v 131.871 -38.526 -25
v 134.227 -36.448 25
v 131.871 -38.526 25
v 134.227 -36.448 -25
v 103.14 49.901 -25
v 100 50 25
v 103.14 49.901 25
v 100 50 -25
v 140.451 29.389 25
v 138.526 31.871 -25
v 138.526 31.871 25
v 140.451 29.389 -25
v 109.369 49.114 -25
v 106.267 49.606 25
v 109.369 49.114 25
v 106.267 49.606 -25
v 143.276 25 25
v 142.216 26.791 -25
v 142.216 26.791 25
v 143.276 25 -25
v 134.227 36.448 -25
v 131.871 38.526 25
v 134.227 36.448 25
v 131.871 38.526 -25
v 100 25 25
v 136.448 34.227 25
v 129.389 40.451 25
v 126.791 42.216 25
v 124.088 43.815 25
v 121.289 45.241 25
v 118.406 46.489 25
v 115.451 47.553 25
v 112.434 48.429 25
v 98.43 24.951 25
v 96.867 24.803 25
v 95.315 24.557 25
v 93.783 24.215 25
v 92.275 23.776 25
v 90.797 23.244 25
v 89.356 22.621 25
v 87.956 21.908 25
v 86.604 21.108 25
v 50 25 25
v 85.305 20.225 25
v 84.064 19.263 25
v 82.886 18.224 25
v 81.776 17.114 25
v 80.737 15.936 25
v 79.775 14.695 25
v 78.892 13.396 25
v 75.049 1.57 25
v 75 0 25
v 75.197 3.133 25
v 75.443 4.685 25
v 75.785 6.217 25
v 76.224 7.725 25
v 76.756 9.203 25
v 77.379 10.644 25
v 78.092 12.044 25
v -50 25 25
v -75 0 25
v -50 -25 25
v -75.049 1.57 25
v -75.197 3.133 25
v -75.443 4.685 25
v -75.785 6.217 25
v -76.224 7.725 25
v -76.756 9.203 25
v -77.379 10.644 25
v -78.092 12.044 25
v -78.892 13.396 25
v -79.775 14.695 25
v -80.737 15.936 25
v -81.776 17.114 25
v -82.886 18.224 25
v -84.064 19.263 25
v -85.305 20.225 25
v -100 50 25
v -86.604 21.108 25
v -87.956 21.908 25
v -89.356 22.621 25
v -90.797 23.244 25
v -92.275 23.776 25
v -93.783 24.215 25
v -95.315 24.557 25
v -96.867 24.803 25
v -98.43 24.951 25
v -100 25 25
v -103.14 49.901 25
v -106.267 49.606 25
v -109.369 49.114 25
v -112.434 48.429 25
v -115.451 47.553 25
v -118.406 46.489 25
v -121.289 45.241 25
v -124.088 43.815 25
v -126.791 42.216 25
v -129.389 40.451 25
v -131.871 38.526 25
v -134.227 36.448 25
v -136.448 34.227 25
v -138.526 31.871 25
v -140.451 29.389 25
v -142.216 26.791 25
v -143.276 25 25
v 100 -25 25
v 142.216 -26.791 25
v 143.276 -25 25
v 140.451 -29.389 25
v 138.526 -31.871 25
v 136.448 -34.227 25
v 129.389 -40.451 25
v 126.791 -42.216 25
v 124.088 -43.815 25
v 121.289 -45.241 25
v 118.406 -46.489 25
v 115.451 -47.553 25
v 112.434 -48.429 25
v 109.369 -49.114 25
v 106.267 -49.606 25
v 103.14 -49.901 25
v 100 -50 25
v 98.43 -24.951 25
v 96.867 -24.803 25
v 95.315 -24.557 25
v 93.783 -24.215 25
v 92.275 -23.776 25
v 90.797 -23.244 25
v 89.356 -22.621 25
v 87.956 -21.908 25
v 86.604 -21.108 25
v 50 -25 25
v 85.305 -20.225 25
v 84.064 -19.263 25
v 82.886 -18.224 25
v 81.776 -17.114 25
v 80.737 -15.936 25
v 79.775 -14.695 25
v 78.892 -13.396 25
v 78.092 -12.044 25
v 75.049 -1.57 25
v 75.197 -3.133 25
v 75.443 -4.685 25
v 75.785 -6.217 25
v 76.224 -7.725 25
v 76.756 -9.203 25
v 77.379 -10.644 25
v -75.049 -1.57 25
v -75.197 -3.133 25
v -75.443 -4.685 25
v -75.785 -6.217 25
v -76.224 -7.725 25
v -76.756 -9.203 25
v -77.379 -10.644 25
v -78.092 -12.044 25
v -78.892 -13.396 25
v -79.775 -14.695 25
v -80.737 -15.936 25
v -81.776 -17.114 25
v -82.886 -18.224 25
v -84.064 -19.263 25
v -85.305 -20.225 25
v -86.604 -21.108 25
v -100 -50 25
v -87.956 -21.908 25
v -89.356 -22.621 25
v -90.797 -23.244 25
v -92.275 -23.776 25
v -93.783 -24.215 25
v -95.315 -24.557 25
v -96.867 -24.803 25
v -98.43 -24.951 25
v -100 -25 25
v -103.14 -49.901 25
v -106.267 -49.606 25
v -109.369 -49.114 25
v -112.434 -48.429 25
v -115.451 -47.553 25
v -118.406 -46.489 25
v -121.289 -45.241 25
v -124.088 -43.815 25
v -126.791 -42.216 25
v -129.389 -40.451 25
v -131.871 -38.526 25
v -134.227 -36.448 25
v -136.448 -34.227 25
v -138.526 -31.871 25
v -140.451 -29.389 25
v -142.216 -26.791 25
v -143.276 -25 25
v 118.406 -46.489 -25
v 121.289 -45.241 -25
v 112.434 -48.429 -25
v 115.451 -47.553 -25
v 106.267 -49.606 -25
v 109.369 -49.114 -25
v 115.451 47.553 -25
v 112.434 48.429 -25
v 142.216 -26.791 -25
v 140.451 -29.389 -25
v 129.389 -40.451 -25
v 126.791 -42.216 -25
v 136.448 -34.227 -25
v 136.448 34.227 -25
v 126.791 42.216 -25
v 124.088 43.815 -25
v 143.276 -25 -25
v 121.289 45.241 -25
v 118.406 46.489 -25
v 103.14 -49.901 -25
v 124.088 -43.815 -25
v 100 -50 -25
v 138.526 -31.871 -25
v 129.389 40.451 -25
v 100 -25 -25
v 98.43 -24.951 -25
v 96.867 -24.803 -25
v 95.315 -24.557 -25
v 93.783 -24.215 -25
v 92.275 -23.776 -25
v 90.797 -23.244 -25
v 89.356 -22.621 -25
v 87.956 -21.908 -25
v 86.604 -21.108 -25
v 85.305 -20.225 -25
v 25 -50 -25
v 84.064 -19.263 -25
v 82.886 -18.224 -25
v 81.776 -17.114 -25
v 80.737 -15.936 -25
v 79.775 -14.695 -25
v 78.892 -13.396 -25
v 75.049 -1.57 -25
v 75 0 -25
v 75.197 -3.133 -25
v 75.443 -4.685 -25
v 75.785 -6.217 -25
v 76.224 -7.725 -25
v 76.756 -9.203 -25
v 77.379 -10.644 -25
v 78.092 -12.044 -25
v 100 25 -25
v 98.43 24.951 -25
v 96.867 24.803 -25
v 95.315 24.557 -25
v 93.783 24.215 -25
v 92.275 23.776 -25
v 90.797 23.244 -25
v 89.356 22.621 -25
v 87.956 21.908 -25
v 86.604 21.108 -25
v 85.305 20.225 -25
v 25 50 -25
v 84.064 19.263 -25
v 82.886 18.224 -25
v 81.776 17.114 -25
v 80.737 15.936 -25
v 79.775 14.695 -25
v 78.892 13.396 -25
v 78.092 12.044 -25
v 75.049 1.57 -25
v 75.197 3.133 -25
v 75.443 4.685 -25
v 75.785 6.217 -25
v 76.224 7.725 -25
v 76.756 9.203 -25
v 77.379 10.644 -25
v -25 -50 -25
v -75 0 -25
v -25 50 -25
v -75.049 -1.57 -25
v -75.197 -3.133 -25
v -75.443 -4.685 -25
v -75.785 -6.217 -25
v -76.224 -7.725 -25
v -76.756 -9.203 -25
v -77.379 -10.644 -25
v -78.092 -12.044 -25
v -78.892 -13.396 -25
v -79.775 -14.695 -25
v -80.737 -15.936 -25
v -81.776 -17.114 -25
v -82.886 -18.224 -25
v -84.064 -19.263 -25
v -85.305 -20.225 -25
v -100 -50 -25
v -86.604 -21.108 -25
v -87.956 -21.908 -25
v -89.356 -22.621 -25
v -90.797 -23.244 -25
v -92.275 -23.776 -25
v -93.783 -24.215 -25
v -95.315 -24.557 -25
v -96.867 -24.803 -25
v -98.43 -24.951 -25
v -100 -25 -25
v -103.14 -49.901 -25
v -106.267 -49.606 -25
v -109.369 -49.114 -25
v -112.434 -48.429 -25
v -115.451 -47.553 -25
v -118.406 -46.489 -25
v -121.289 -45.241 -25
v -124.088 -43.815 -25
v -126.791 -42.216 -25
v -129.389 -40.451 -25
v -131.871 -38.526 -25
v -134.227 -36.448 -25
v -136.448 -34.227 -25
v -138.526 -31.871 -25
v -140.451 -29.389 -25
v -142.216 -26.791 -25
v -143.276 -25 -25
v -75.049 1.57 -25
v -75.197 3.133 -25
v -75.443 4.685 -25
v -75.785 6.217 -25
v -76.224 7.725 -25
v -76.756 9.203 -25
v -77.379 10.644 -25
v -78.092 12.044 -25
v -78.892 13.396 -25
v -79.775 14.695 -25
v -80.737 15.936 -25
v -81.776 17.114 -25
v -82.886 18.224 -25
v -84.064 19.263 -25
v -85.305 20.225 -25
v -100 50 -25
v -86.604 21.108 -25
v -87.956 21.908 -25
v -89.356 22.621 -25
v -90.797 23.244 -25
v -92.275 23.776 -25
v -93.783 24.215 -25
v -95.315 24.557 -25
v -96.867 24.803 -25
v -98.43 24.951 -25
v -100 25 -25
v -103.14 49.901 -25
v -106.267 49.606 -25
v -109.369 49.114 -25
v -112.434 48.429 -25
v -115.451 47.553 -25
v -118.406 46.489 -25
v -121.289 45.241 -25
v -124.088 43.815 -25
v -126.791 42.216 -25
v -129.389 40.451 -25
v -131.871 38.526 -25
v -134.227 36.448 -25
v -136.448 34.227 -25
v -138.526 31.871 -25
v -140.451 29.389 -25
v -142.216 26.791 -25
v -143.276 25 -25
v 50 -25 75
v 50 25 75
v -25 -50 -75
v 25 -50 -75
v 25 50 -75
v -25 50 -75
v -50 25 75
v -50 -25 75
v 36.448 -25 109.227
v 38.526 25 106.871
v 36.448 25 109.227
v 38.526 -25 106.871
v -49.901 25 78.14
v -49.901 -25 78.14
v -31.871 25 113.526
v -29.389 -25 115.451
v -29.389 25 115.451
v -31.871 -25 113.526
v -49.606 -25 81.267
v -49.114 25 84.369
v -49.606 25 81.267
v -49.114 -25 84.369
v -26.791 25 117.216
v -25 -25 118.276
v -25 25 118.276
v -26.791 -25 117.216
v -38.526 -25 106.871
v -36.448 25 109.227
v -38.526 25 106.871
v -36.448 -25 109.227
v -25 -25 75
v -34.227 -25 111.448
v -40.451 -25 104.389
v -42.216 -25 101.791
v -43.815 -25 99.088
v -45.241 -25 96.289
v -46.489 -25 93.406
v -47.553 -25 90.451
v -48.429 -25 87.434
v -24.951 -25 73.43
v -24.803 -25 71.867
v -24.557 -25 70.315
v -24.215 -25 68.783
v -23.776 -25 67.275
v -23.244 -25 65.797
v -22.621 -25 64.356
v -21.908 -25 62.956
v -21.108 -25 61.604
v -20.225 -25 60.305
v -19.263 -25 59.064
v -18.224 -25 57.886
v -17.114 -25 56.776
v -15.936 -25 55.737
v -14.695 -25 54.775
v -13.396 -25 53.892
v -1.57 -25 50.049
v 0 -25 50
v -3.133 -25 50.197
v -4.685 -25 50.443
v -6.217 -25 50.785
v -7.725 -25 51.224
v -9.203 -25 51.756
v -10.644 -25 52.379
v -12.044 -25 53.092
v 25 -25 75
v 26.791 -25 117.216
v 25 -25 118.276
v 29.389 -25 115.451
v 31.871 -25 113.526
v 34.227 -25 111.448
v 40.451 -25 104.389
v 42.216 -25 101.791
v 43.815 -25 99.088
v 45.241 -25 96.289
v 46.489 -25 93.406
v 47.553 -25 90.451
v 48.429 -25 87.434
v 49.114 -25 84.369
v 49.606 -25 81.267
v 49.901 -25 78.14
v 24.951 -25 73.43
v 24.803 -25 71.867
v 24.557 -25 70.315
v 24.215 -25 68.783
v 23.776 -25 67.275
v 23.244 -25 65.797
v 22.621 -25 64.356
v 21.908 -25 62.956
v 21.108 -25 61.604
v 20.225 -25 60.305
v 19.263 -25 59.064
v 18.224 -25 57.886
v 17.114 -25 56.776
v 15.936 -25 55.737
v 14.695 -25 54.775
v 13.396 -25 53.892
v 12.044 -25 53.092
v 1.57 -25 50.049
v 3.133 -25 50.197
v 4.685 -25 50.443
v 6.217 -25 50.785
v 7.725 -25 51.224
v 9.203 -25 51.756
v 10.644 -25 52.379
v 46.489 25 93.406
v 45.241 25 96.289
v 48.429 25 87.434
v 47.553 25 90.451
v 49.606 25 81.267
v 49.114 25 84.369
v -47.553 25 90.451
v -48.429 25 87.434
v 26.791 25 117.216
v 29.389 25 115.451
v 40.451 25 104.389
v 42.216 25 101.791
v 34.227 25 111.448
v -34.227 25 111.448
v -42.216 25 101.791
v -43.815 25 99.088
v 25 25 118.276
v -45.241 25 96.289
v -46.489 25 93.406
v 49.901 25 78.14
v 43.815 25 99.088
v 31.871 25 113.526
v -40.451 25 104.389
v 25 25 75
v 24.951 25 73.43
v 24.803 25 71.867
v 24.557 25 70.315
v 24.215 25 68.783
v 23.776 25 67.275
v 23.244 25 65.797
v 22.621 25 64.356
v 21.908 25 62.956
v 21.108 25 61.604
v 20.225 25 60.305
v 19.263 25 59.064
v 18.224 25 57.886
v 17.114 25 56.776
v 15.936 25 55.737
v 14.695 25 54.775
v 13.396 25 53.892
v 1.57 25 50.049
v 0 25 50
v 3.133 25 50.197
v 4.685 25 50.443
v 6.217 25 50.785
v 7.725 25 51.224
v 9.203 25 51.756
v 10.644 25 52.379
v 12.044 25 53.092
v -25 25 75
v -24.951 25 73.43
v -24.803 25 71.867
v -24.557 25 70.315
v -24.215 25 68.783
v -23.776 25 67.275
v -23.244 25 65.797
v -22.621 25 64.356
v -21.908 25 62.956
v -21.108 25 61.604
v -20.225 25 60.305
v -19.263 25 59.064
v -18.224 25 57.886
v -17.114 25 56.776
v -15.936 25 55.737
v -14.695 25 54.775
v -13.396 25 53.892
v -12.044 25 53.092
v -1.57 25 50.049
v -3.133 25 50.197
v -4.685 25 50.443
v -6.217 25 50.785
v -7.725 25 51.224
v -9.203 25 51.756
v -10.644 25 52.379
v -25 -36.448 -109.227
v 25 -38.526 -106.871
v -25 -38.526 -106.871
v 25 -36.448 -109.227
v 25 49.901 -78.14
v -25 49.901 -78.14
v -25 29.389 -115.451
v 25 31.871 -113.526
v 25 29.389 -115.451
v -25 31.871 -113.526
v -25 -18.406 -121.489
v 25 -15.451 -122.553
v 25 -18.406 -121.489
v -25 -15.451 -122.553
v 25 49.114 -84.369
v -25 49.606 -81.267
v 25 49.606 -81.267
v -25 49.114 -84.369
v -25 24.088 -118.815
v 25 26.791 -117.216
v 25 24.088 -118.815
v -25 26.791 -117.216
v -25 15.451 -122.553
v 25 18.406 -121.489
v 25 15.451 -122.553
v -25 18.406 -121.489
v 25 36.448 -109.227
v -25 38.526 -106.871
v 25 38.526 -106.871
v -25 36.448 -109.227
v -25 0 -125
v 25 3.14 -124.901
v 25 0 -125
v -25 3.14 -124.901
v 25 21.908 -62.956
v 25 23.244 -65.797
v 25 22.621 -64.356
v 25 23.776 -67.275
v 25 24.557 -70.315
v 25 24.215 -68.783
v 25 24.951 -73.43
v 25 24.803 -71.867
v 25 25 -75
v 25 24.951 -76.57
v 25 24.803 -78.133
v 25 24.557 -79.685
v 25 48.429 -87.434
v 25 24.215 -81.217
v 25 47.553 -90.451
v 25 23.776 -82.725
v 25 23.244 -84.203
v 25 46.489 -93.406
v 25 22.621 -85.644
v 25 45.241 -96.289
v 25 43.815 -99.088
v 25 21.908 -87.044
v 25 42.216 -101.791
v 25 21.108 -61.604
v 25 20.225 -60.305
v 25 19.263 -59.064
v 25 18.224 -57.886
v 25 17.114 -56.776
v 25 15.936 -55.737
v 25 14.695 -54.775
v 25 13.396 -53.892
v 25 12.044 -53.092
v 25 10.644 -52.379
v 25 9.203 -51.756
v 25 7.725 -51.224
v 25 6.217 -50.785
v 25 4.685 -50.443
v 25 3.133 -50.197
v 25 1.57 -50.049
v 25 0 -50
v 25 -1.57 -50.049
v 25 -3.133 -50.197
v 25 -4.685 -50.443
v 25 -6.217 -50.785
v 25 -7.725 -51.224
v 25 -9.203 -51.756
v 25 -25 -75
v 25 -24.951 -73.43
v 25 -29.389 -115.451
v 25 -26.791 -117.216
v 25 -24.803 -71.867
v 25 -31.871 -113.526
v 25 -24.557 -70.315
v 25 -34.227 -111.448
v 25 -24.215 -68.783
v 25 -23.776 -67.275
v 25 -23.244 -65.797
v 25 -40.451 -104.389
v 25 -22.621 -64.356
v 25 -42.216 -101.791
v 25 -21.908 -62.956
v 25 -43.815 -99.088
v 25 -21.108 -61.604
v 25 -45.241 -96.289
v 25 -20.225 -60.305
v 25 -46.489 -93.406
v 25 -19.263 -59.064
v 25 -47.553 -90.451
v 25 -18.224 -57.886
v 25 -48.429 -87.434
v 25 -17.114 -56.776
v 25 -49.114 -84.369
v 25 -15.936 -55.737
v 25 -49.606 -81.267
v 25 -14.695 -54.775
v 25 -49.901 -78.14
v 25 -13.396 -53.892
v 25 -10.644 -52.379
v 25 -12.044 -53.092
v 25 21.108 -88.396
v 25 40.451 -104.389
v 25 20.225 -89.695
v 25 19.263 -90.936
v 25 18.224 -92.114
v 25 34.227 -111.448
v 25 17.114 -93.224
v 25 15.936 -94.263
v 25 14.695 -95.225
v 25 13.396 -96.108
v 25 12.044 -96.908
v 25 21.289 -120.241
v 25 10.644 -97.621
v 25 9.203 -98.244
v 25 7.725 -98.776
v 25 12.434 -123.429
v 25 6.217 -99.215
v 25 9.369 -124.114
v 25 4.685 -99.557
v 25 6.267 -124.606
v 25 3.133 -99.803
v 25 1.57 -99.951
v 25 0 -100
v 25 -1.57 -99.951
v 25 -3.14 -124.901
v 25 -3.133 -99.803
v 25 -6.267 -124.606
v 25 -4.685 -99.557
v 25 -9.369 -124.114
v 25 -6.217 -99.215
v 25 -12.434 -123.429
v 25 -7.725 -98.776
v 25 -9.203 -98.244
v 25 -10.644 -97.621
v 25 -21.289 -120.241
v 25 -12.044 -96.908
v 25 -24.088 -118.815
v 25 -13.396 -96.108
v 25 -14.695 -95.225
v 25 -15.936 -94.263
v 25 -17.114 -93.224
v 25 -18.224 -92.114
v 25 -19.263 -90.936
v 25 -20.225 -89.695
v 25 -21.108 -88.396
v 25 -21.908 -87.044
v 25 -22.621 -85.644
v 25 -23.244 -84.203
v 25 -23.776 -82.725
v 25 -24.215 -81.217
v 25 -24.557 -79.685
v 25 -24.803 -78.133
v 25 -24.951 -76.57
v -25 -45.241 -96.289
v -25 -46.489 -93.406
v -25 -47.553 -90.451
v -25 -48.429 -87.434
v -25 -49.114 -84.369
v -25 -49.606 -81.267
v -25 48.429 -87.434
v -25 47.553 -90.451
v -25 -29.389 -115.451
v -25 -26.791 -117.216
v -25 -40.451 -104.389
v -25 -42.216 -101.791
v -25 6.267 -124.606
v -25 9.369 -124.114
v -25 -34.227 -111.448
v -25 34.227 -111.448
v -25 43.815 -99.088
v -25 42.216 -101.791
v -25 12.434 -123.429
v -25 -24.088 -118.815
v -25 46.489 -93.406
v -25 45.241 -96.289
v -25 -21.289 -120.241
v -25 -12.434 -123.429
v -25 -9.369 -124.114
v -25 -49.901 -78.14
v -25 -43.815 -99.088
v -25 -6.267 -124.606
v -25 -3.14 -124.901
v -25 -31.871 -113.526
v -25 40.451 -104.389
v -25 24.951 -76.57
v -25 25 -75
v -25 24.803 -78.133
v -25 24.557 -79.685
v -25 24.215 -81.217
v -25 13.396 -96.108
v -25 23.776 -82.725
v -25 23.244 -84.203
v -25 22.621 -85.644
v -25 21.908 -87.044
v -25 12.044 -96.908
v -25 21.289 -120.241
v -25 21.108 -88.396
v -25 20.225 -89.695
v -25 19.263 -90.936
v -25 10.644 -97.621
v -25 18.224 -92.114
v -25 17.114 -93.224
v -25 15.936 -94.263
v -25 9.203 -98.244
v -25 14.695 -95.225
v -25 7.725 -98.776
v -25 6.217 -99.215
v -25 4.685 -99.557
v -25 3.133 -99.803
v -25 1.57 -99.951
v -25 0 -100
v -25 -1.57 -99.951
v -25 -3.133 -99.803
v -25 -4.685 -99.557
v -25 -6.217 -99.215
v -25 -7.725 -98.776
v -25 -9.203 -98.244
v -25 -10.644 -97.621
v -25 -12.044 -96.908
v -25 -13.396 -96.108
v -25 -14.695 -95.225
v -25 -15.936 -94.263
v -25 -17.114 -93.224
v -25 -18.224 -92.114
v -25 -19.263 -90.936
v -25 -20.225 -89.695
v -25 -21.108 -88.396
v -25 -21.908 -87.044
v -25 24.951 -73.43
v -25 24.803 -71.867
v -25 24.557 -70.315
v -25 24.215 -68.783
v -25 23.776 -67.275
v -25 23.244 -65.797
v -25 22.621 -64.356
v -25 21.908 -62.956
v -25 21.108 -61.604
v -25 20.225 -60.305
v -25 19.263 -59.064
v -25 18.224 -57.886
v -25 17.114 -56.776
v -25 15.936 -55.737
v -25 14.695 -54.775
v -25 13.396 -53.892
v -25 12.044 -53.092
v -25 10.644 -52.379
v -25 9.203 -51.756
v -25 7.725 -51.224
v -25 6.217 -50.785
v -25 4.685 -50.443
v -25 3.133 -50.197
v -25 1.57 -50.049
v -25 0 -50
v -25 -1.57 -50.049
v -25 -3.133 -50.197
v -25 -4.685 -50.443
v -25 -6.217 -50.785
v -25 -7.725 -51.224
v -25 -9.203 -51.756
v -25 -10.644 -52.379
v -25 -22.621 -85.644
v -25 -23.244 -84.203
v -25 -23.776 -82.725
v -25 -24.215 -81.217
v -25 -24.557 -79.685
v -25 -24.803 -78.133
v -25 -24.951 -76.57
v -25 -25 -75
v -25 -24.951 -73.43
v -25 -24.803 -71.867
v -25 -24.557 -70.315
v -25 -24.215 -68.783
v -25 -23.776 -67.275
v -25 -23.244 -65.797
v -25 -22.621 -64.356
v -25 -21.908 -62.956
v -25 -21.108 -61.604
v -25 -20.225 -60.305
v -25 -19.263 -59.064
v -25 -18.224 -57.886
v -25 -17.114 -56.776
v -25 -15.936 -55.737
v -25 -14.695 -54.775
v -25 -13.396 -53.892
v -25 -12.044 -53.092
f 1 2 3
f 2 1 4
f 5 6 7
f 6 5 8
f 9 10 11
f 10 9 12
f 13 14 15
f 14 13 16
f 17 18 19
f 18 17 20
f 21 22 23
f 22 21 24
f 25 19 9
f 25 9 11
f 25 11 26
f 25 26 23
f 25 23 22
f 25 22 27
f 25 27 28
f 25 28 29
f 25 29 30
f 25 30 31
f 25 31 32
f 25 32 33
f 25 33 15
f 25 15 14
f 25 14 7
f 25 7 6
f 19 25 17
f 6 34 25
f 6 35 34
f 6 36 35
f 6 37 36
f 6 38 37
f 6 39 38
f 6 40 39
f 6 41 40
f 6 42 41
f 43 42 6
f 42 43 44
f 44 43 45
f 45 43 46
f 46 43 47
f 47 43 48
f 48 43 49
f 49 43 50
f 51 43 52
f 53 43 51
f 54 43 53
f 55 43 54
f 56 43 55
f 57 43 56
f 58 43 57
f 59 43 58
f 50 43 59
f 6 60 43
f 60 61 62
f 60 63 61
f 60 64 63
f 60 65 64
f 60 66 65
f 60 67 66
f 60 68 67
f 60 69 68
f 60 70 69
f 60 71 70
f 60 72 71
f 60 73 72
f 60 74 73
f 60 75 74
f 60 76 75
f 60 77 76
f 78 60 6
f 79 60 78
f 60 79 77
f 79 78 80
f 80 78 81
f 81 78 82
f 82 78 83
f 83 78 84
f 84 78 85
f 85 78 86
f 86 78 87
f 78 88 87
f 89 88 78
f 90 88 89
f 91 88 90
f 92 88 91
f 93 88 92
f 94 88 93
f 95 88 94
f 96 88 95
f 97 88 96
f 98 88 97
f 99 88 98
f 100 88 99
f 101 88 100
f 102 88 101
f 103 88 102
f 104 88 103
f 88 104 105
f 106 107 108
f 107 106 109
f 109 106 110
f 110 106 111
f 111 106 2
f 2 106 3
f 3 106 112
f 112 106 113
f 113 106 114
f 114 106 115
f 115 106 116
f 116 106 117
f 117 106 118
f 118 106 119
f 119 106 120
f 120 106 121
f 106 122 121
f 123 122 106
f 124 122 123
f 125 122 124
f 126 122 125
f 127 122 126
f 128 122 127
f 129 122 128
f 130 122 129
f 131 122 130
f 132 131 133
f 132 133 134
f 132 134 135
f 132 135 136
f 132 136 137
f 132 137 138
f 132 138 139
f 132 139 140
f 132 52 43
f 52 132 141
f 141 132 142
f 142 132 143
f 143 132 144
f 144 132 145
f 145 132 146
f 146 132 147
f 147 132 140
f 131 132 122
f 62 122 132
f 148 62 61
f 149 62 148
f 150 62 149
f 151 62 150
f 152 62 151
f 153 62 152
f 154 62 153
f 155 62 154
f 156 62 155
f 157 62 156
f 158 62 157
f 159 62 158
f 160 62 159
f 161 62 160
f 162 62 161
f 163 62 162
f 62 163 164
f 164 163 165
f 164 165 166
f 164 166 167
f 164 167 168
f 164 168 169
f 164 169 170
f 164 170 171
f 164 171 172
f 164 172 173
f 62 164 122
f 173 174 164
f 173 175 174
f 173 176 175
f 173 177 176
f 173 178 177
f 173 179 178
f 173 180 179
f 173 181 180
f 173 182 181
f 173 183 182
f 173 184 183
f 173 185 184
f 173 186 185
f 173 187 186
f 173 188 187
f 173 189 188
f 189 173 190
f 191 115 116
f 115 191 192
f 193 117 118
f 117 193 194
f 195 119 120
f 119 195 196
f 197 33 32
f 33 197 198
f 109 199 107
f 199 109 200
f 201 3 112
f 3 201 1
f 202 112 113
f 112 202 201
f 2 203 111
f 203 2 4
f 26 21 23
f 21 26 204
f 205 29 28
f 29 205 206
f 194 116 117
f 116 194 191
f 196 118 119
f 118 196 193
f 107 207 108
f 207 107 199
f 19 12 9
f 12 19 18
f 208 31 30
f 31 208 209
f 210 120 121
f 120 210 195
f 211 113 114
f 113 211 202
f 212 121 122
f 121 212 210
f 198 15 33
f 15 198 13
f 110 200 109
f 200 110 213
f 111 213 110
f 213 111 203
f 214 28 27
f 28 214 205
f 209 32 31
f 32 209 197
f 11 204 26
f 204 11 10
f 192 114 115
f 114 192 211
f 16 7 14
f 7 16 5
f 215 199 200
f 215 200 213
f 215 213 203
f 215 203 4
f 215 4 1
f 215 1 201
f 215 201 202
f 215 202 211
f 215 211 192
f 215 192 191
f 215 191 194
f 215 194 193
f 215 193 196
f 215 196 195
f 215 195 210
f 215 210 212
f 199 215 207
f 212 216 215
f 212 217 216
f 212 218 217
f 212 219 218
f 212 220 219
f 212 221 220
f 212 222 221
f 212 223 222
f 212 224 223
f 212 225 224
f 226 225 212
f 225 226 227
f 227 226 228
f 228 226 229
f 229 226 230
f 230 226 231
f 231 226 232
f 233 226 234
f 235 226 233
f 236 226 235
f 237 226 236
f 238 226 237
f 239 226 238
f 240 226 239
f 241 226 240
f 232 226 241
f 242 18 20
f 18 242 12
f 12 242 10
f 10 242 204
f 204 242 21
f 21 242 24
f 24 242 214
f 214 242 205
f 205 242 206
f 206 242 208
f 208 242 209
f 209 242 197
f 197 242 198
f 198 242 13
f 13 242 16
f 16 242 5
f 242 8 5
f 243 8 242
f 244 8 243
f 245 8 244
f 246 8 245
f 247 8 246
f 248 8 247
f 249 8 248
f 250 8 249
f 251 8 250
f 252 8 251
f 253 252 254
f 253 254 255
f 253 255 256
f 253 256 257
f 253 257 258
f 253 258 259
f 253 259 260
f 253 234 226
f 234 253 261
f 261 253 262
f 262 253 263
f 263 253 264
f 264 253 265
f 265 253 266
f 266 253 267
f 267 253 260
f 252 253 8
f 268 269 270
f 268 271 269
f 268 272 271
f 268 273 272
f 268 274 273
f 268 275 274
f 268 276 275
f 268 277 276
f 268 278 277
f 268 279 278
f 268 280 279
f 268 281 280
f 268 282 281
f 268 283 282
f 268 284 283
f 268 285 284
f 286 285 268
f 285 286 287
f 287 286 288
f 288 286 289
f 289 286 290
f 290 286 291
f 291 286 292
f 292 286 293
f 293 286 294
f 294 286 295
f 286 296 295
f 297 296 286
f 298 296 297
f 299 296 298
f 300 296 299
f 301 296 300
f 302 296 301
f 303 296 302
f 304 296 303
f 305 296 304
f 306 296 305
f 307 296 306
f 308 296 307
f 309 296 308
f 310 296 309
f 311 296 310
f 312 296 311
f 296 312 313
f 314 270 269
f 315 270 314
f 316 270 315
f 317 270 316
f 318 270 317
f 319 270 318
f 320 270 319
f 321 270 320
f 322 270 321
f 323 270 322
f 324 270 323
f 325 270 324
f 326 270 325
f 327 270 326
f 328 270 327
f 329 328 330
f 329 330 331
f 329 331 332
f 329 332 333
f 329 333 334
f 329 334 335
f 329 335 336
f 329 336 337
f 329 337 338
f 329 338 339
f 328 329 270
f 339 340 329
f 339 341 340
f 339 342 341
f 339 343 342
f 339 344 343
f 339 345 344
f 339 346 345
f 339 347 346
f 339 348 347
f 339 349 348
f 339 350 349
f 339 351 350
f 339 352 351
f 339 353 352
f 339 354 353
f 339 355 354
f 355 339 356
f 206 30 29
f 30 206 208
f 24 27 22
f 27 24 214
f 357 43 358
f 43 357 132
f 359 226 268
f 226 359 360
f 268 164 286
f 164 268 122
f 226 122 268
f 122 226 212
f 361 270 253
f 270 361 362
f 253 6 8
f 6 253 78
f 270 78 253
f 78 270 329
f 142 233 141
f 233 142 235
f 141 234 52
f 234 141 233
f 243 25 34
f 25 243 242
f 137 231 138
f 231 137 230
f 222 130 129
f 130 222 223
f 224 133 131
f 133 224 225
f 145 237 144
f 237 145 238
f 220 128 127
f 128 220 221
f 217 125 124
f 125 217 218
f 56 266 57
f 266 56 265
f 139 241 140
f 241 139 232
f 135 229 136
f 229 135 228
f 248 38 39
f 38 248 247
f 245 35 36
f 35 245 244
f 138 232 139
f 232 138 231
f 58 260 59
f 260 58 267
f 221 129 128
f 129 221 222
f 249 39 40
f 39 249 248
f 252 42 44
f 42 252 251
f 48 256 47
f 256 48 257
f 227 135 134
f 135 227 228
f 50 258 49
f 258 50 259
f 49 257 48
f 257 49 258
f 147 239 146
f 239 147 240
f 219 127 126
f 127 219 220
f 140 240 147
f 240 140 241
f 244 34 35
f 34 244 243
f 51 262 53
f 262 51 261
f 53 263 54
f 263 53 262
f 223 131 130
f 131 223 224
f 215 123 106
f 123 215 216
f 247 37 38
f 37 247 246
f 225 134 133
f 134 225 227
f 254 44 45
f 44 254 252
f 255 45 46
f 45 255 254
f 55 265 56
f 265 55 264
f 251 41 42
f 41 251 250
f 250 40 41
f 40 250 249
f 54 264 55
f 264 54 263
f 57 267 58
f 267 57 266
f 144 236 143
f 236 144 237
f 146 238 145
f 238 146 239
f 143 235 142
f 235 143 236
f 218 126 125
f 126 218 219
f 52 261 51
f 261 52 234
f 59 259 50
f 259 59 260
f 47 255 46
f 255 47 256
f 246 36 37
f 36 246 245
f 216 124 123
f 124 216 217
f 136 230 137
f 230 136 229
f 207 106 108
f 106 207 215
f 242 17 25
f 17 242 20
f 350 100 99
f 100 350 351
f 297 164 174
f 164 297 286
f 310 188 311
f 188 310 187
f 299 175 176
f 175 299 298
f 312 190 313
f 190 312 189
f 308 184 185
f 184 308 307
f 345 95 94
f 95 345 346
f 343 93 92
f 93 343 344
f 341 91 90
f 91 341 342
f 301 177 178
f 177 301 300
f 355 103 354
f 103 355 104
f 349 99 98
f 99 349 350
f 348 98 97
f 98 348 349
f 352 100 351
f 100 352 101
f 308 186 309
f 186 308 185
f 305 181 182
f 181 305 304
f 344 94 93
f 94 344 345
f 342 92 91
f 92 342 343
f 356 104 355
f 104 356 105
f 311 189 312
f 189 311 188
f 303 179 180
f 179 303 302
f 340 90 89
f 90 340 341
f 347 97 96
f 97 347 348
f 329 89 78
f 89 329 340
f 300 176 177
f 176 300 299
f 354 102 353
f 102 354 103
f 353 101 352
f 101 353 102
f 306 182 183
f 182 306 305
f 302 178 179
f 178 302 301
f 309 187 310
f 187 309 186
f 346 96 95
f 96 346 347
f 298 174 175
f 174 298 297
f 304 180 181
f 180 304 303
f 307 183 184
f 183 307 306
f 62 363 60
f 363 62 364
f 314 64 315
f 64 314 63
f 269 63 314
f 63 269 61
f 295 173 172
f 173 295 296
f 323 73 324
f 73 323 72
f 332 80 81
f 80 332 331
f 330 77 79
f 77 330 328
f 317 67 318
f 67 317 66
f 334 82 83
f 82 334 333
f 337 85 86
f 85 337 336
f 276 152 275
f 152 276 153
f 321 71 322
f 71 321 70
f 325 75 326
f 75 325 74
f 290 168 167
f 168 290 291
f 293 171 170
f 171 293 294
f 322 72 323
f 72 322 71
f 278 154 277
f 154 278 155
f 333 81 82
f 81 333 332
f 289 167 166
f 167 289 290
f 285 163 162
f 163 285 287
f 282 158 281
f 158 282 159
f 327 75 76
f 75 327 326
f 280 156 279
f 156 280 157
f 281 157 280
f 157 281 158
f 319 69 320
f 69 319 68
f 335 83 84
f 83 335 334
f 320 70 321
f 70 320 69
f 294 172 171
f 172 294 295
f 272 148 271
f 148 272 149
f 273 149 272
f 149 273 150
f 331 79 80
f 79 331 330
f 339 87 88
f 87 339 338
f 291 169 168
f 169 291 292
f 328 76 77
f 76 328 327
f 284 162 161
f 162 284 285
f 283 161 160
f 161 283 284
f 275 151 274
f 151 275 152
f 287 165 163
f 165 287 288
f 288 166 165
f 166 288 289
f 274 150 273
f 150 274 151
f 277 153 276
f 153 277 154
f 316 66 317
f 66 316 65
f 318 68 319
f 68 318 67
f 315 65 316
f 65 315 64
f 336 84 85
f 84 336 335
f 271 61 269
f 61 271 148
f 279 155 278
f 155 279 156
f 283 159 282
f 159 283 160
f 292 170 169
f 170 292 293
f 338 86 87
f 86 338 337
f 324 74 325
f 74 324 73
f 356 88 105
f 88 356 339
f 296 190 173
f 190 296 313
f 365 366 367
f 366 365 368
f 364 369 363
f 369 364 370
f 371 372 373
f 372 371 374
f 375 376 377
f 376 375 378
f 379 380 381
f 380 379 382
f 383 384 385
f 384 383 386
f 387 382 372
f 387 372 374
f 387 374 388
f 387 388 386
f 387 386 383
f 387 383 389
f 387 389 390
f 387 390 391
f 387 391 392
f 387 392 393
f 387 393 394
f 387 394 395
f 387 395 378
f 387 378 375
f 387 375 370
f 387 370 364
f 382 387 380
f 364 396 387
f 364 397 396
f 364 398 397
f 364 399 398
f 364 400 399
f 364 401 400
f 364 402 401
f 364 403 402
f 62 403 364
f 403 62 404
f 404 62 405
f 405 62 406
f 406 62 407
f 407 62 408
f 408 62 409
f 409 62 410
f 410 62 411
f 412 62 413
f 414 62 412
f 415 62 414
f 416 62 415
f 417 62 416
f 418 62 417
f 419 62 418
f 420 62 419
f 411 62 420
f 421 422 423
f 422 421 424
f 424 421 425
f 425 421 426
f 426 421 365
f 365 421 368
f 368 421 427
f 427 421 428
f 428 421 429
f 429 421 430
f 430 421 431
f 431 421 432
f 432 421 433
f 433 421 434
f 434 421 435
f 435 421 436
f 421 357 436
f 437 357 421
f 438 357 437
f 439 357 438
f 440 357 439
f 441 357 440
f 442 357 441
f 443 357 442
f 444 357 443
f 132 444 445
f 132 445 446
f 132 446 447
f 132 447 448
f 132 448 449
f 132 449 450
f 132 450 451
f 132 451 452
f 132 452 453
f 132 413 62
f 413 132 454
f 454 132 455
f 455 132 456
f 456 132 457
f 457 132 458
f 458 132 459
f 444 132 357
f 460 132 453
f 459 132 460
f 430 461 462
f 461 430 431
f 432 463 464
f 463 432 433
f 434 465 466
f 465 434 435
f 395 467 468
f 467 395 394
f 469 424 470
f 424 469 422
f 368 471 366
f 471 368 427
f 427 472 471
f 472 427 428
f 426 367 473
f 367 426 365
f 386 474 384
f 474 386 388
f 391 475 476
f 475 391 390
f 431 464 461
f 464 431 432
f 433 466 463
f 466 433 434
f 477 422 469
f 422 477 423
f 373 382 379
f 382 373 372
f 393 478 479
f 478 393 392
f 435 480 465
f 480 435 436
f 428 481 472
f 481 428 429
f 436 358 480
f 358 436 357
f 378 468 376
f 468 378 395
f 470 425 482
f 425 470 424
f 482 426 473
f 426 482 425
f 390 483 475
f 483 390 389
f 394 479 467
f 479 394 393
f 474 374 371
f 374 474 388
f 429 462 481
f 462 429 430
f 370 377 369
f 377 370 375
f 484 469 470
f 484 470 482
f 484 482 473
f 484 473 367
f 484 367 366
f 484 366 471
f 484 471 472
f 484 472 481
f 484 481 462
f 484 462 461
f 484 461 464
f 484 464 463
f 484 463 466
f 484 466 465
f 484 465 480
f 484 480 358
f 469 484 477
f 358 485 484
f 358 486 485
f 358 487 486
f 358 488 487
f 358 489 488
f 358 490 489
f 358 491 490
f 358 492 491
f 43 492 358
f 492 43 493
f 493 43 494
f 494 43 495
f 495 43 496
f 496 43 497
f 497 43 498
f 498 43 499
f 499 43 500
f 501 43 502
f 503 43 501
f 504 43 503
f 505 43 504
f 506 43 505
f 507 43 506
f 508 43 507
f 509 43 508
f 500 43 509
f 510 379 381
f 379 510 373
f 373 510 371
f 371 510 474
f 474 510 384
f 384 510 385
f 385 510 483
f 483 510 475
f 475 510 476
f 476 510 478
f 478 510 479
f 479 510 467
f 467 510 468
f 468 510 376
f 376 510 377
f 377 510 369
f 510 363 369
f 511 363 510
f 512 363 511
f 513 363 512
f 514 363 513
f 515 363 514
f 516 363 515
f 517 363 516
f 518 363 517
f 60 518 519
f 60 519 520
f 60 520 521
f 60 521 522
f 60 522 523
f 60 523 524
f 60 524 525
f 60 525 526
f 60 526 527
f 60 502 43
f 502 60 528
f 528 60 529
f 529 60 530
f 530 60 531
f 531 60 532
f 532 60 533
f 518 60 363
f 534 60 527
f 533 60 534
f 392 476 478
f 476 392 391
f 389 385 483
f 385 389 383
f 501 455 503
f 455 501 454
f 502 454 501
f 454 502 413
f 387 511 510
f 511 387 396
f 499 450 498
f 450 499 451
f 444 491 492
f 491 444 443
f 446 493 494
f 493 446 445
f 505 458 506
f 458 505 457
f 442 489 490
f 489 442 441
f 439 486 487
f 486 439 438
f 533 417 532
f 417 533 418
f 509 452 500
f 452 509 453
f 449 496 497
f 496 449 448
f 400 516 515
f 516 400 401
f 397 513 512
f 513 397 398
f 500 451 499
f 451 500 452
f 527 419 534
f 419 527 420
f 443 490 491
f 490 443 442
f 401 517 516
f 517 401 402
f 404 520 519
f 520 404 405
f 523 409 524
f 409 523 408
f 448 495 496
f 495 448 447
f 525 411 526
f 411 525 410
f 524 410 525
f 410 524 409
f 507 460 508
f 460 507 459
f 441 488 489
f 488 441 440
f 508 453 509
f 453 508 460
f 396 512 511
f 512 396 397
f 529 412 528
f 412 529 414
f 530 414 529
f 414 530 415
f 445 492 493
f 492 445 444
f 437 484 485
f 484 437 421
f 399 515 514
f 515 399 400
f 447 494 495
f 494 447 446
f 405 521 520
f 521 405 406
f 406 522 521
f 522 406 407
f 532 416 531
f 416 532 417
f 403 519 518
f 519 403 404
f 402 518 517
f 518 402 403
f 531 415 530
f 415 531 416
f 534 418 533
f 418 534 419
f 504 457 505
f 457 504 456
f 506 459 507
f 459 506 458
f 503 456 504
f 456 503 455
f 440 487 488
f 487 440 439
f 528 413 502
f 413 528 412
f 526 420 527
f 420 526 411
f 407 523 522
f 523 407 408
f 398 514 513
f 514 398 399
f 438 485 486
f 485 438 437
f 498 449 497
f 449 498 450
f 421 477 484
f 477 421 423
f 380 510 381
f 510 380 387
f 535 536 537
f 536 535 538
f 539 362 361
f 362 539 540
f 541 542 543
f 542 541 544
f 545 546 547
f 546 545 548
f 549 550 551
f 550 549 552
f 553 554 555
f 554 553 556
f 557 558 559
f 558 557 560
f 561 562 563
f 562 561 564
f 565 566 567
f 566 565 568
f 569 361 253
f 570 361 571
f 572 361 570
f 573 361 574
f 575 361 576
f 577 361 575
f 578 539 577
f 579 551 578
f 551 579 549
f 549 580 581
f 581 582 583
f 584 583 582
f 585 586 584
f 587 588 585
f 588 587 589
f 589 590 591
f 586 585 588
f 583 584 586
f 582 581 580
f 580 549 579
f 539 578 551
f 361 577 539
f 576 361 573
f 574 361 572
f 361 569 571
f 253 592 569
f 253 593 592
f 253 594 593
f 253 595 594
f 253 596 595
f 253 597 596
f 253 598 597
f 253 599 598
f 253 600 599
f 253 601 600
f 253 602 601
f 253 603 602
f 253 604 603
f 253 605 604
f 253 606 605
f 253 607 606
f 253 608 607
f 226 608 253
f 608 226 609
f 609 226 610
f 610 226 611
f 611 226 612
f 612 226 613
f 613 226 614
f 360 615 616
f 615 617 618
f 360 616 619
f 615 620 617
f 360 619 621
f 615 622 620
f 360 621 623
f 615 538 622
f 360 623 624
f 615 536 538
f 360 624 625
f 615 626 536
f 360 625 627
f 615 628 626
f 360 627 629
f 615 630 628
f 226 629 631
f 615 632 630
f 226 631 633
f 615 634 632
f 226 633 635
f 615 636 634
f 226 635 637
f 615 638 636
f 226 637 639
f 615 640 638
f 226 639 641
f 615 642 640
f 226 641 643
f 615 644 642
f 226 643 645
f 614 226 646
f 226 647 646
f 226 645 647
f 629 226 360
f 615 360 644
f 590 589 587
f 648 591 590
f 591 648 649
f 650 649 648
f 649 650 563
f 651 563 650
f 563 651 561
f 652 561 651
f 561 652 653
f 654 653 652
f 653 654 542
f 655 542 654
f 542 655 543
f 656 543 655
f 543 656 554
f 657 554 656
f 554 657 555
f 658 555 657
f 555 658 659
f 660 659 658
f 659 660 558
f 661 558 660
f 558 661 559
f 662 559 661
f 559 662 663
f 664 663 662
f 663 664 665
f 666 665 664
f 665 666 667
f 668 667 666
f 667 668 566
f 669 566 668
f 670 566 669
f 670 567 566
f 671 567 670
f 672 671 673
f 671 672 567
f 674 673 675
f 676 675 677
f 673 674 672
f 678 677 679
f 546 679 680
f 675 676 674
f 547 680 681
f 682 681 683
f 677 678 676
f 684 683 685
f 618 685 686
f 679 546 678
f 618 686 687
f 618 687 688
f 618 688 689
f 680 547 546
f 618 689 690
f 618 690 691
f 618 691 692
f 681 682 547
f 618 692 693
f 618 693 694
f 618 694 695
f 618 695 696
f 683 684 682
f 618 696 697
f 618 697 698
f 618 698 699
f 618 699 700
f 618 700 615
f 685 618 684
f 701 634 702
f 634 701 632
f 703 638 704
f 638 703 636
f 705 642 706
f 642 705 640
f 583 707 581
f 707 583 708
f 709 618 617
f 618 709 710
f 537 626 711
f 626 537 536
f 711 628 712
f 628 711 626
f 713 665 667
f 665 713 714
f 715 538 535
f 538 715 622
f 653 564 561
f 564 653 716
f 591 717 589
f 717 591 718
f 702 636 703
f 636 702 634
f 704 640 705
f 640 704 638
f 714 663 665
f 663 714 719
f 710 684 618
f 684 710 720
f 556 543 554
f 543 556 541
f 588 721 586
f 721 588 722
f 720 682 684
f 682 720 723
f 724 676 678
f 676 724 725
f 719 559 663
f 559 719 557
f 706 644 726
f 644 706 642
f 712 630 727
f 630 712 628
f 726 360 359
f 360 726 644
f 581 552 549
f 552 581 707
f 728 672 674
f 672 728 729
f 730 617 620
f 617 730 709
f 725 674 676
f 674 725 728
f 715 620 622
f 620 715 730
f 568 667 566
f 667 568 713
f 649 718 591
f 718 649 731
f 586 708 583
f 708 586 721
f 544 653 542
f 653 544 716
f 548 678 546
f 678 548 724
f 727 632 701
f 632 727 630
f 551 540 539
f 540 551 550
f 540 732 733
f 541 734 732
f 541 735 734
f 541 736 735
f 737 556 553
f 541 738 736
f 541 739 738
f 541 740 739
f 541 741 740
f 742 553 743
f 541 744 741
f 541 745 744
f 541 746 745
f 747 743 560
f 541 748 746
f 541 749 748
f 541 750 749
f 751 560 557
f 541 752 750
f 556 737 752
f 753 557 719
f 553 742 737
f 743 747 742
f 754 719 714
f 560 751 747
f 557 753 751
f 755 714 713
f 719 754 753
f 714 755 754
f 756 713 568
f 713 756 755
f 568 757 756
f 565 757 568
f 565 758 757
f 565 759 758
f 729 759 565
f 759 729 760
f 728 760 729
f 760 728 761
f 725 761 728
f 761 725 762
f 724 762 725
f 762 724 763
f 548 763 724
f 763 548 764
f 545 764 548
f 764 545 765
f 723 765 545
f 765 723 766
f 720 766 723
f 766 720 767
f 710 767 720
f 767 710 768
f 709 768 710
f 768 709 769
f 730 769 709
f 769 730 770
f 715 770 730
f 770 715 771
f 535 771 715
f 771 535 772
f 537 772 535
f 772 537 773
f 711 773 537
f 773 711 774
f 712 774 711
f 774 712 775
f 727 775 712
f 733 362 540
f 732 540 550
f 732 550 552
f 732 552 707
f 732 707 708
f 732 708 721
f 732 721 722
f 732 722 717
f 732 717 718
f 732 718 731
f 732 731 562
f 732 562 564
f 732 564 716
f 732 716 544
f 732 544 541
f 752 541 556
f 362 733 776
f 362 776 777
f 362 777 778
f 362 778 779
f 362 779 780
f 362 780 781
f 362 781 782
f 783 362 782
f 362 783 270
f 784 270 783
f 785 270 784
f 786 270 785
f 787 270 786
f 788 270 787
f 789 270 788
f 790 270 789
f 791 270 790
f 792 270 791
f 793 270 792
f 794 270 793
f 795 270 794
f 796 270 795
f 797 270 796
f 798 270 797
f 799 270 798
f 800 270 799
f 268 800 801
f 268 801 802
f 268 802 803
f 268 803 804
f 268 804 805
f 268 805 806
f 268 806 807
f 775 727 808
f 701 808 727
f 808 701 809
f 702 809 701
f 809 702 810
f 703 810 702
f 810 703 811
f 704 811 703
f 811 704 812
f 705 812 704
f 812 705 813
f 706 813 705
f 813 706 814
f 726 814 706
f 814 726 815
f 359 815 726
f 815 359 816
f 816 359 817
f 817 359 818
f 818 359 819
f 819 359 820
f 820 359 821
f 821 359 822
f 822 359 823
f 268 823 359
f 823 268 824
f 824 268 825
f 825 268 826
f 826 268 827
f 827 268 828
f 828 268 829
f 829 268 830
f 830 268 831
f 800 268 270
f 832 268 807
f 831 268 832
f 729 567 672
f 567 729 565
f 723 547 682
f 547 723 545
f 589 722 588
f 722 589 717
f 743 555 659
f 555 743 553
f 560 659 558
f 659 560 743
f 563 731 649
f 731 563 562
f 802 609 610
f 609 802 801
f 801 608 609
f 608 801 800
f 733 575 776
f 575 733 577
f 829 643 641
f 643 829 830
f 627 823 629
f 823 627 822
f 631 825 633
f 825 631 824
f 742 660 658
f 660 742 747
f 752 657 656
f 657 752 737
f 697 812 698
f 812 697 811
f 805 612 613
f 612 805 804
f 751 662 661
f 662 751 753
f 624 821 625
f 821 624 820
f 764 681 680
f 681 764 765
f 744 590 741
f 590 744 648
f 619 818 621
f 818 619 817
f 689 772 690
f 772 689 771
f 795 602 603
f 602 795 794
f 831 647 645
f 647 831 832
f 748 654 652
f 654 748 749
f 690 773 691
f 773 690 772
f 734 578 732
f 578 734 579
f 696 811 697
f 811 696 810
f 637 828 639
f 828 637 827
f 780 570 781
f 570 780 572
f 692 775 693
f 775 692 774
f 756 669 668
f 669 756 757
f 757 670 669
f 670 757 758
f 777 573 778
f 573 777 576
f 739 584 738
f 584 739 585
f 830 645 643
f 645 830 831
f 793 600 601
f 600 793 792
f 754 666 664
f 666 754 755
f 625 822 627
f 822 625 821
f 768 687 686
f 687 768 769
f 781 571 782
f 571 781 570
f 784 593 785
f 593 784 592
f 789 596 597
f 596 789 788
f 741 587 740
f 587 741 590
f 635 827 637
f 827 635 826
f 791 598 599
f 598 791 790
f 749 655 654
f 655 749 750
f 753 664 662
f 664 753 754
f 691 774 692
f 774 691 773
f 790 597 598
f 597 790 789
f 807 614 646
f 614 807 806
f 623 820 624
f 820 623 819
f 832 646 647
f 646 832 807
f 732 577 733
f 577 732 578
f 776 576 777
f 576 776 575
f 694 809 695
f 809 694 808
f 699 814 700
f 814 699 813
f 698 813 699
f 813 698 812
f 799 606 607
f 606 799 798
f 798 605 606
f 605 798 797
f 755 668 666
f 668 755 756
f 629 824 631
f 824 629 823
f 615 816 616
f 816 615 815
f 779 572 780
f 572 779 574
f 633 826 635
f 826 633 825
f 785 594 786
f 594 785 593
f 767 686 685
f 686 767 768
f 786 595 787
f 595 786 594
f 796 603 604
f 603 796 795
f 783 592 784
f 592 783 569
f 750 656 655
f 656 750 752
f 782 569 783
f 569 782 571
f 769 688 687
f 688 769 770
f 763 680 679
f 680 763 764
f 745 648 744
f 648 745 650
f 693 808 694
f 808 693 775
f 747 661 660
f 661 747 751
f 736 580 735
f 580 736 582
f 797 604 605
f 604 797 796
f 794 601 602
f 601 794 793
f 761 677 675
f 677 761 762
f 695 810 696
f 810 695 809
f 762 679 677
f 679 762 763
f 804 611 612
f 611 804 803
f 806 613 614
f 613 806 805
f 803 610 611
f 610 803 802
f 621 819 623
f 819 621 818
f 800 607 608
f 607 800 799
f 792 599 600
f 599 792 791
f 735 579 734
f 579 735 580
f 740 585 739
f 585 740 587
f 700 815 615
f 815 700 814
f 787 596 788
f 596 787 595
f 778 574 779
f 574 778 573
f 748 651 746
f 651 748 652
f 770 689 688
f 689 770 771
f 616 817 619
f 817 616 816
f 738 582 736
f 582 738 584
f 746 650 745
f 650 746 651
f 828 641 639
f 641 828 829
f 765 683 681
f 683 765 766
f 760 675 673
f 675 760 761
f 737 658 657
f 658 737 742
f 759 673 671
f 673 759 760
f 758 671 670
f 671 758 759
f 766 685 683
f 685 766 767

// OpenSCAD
// file: lib.scad
/*
 * Sum all of the elements in a vector.
 */
function sum(x, i = 0)=
     len(x) > i
     ?x[i]
      +sum(x, i + 1)
     :0;
/*
 * Count the number of non-undef elements of a list.
 */
function count_defined(list) =
     sum([
      for (e=list)
	   if(e!=undef)
	      1]);
/*
 * Return the first non-undef element, if there is one.
 */
function any(list) =
     [for(e=list)
	 if(e!=undef)
	    e
     ][0];
/*
 * Assert that exactly one element is non-undef and return it.
 */
function unique(list,message) =
     message
     ?assert(count_defined(list)==1,message)
      any(list)
     :any(list);


/*
 * A copy of =cylinder= that is slightly taller so that =difference=
 * dosen't cause graphical glitches.
 */
module wcylinder(h,r,r1,r2,d,d1,d2,center){
     fix_delta=1;
     if(center){
	  cylinder(h=h+fix_delta,r=r,r1=r1,r2=r2,d=d,d1=d1,d2=d2,center=center);}
     else{
	  translate(down(fix_delta)){
	       cylinder(h=h+2*fix_delta,r=r,r1=r1,r2=r2,d=d,d1=d1,d2=d2,center=center);}}}

/*
 * Make a pair of an object.
 *
 * @param split The distance to separate the pair.
 *        radius
 *        diameter
 *        r
 *        d
 *
 * @param rot An optional amount to rotate the pair.
 *        theta
 *
 * @param edge Center on the left of the pair rather than the middle.
 *
 * @pair mirrored Make the left a mirror of the right instead of a
 *                rotation.
 */
module pair(split,rot,edge=false,mirrored=false,
     radius,r,diameter,d,theta){
     rad=unique([split/2,radius,r,diameter,d/2],
		"Distance required.");
     angle=any([rot,theta,0]);
     module center(){
	  if(edge){
	       translate([rad,0,0]){
		    children();}}
	  else{
	       children();}}
     module flip(){
	  if(mirrored){
	       mirror([0,1,0]){
		    children();}}
	  else{
	       rotate([0,0,180]){
		    children();}}}
     rotate([0,0,angle]){
	  center(){
	       translate([rad,0,0]){
		    children();}
	       translate([-rad,0,0]){
		    flip(){
			 children();}}}}}

module xpair(split,rot=0,edge=false){
     pair(split,rot,edge){
	  children();}}
module ypair(split,rot=0,edge=false){
     rotate(90){
	  pair(split,rot,edge){
	       rotate(-90){
		    children();}}}}

/*
 * Make a pair but with a middle element.
 *
 * @param split The distance to seperate the pair.
 *
 * @param rot An optional amount to rotate the pair.
 */
module tripple(split,rot=0){
     rotate([0,0,90]){
	  children();}
     pair(split,rot){
	  children();}}
/*
 * Make a set of objects in a circle.
 *
 * @param count The number of elements in the circle
 *
 * @param r The radius of the circle.
 */
module set(count,radius,
	   c,r,diameter,d){
     cnt=unique([count,c],
		"Count required.");
     rad=unique([radius,r,diameter/2,d/2],
		"Radius required.");
     for(i=[0:cnt]){
	  rotate([0,0,360/cnt*i]){
	       translate([rad,0,0]){
		    children();}}}}

/*
 * A quick rename of translate along z.
 *
 * @param distance The distance to lift by.
 */
function up(distance)=
     [0,0,unique([distance],"Distance required.")];
function down(distance)=
     up(-distance);
function right(distance)=
     [0,unique([distance],"Distance required."),0];
function left(distance)=
     right(-distance);
function forward(distance)=
     [unique([distance],"Distance required."),0,0];
function back(distance)=
     forward(-distance);

/*
 * A rectangle with a circular end.
 */
module arch(radius,height,thickness,
	    r,h,t,
	    window_radius,w){
     rad=unique([radius,r],
		"Radius required.");
     hei=unique([height,h],
		"Height required.");
     th=unique([thickness,t],
	       "Thickness required.");
     wi=any([window_radius,w]);
     if(wi){
	  difference(){
	       arch(r=rad,h=hei,t=th);
	       wcylinder(r=wi,h=th);}}
     else{
	  cylinder(r=rad,h=th);
	  translate([0,-rad,0]){
	       cube([hei-rad,2*rad,th]);}}}


/*
 * An annulus.
 *
 * @param outer_radius The outer radius.
 *        radius_outer
 *        ro
 *
 * @param inner_radius The inner radius.
 *        radius_inner
 *        ri 
 *
 * @param height The height of the annulus.
 *        h
 */
module annulus(outer_radius,inner_radius,height,
	       radius_outer,radius_inner,
	       ro,ri,h,center=false){
     rad_out=unique([outer_radius,radius_outer,ro],
		    "Outer radius required.");
     rad_in=unique([inner_radius,radius_inner,ri],
		   "Inner radius required.");
     hei=unique([height,h],
		"Height required.");
     if(rad_in<0){
	  difference(){
	       cylinder(r=rad_out,h=hei,center=center);
	       wcylinder(r=rad_out+rad_in,h=hei,center=center);}}
     else{
	  difference(){
	       cylinder(r=rad_out,h=hei,center=center);
	       wcylinder(r=rad_in,h=hei,center=center);}}}
// main file
$fn=100;
mm=1; // define units
degrees=1;

use <lib.scad>

module example_114(){
     body_size=100*mm;
     module claw(c=true){
	  peg_percent=.5;
	  translate(forward(50)+down(25)){
	       rotate(180){
		    difference(){
			 arch(r=body_size/2,
			      w=body_size/2*peg_percent,
			      h=body_size,
			      t=body_size/2);
			 if(c){
			      hull(){
				   pair(d=-/*overcut*/body_size,edge=true){
					wcylinder(r=body_size/2*peg_percent,
						  h=body_size);}}}}}}}
     module body(){
	  cube(body_size*[1,1,.5],
	       center=true);}

     body();
     pair(100){
	  claw();}
     translate(up(25)){
	  rotate([90,-90,0]){
	       claw();}}
     translate(down(25)){
	  rotate([0,90,0]){
	       claw(false);}}}

example_114();
